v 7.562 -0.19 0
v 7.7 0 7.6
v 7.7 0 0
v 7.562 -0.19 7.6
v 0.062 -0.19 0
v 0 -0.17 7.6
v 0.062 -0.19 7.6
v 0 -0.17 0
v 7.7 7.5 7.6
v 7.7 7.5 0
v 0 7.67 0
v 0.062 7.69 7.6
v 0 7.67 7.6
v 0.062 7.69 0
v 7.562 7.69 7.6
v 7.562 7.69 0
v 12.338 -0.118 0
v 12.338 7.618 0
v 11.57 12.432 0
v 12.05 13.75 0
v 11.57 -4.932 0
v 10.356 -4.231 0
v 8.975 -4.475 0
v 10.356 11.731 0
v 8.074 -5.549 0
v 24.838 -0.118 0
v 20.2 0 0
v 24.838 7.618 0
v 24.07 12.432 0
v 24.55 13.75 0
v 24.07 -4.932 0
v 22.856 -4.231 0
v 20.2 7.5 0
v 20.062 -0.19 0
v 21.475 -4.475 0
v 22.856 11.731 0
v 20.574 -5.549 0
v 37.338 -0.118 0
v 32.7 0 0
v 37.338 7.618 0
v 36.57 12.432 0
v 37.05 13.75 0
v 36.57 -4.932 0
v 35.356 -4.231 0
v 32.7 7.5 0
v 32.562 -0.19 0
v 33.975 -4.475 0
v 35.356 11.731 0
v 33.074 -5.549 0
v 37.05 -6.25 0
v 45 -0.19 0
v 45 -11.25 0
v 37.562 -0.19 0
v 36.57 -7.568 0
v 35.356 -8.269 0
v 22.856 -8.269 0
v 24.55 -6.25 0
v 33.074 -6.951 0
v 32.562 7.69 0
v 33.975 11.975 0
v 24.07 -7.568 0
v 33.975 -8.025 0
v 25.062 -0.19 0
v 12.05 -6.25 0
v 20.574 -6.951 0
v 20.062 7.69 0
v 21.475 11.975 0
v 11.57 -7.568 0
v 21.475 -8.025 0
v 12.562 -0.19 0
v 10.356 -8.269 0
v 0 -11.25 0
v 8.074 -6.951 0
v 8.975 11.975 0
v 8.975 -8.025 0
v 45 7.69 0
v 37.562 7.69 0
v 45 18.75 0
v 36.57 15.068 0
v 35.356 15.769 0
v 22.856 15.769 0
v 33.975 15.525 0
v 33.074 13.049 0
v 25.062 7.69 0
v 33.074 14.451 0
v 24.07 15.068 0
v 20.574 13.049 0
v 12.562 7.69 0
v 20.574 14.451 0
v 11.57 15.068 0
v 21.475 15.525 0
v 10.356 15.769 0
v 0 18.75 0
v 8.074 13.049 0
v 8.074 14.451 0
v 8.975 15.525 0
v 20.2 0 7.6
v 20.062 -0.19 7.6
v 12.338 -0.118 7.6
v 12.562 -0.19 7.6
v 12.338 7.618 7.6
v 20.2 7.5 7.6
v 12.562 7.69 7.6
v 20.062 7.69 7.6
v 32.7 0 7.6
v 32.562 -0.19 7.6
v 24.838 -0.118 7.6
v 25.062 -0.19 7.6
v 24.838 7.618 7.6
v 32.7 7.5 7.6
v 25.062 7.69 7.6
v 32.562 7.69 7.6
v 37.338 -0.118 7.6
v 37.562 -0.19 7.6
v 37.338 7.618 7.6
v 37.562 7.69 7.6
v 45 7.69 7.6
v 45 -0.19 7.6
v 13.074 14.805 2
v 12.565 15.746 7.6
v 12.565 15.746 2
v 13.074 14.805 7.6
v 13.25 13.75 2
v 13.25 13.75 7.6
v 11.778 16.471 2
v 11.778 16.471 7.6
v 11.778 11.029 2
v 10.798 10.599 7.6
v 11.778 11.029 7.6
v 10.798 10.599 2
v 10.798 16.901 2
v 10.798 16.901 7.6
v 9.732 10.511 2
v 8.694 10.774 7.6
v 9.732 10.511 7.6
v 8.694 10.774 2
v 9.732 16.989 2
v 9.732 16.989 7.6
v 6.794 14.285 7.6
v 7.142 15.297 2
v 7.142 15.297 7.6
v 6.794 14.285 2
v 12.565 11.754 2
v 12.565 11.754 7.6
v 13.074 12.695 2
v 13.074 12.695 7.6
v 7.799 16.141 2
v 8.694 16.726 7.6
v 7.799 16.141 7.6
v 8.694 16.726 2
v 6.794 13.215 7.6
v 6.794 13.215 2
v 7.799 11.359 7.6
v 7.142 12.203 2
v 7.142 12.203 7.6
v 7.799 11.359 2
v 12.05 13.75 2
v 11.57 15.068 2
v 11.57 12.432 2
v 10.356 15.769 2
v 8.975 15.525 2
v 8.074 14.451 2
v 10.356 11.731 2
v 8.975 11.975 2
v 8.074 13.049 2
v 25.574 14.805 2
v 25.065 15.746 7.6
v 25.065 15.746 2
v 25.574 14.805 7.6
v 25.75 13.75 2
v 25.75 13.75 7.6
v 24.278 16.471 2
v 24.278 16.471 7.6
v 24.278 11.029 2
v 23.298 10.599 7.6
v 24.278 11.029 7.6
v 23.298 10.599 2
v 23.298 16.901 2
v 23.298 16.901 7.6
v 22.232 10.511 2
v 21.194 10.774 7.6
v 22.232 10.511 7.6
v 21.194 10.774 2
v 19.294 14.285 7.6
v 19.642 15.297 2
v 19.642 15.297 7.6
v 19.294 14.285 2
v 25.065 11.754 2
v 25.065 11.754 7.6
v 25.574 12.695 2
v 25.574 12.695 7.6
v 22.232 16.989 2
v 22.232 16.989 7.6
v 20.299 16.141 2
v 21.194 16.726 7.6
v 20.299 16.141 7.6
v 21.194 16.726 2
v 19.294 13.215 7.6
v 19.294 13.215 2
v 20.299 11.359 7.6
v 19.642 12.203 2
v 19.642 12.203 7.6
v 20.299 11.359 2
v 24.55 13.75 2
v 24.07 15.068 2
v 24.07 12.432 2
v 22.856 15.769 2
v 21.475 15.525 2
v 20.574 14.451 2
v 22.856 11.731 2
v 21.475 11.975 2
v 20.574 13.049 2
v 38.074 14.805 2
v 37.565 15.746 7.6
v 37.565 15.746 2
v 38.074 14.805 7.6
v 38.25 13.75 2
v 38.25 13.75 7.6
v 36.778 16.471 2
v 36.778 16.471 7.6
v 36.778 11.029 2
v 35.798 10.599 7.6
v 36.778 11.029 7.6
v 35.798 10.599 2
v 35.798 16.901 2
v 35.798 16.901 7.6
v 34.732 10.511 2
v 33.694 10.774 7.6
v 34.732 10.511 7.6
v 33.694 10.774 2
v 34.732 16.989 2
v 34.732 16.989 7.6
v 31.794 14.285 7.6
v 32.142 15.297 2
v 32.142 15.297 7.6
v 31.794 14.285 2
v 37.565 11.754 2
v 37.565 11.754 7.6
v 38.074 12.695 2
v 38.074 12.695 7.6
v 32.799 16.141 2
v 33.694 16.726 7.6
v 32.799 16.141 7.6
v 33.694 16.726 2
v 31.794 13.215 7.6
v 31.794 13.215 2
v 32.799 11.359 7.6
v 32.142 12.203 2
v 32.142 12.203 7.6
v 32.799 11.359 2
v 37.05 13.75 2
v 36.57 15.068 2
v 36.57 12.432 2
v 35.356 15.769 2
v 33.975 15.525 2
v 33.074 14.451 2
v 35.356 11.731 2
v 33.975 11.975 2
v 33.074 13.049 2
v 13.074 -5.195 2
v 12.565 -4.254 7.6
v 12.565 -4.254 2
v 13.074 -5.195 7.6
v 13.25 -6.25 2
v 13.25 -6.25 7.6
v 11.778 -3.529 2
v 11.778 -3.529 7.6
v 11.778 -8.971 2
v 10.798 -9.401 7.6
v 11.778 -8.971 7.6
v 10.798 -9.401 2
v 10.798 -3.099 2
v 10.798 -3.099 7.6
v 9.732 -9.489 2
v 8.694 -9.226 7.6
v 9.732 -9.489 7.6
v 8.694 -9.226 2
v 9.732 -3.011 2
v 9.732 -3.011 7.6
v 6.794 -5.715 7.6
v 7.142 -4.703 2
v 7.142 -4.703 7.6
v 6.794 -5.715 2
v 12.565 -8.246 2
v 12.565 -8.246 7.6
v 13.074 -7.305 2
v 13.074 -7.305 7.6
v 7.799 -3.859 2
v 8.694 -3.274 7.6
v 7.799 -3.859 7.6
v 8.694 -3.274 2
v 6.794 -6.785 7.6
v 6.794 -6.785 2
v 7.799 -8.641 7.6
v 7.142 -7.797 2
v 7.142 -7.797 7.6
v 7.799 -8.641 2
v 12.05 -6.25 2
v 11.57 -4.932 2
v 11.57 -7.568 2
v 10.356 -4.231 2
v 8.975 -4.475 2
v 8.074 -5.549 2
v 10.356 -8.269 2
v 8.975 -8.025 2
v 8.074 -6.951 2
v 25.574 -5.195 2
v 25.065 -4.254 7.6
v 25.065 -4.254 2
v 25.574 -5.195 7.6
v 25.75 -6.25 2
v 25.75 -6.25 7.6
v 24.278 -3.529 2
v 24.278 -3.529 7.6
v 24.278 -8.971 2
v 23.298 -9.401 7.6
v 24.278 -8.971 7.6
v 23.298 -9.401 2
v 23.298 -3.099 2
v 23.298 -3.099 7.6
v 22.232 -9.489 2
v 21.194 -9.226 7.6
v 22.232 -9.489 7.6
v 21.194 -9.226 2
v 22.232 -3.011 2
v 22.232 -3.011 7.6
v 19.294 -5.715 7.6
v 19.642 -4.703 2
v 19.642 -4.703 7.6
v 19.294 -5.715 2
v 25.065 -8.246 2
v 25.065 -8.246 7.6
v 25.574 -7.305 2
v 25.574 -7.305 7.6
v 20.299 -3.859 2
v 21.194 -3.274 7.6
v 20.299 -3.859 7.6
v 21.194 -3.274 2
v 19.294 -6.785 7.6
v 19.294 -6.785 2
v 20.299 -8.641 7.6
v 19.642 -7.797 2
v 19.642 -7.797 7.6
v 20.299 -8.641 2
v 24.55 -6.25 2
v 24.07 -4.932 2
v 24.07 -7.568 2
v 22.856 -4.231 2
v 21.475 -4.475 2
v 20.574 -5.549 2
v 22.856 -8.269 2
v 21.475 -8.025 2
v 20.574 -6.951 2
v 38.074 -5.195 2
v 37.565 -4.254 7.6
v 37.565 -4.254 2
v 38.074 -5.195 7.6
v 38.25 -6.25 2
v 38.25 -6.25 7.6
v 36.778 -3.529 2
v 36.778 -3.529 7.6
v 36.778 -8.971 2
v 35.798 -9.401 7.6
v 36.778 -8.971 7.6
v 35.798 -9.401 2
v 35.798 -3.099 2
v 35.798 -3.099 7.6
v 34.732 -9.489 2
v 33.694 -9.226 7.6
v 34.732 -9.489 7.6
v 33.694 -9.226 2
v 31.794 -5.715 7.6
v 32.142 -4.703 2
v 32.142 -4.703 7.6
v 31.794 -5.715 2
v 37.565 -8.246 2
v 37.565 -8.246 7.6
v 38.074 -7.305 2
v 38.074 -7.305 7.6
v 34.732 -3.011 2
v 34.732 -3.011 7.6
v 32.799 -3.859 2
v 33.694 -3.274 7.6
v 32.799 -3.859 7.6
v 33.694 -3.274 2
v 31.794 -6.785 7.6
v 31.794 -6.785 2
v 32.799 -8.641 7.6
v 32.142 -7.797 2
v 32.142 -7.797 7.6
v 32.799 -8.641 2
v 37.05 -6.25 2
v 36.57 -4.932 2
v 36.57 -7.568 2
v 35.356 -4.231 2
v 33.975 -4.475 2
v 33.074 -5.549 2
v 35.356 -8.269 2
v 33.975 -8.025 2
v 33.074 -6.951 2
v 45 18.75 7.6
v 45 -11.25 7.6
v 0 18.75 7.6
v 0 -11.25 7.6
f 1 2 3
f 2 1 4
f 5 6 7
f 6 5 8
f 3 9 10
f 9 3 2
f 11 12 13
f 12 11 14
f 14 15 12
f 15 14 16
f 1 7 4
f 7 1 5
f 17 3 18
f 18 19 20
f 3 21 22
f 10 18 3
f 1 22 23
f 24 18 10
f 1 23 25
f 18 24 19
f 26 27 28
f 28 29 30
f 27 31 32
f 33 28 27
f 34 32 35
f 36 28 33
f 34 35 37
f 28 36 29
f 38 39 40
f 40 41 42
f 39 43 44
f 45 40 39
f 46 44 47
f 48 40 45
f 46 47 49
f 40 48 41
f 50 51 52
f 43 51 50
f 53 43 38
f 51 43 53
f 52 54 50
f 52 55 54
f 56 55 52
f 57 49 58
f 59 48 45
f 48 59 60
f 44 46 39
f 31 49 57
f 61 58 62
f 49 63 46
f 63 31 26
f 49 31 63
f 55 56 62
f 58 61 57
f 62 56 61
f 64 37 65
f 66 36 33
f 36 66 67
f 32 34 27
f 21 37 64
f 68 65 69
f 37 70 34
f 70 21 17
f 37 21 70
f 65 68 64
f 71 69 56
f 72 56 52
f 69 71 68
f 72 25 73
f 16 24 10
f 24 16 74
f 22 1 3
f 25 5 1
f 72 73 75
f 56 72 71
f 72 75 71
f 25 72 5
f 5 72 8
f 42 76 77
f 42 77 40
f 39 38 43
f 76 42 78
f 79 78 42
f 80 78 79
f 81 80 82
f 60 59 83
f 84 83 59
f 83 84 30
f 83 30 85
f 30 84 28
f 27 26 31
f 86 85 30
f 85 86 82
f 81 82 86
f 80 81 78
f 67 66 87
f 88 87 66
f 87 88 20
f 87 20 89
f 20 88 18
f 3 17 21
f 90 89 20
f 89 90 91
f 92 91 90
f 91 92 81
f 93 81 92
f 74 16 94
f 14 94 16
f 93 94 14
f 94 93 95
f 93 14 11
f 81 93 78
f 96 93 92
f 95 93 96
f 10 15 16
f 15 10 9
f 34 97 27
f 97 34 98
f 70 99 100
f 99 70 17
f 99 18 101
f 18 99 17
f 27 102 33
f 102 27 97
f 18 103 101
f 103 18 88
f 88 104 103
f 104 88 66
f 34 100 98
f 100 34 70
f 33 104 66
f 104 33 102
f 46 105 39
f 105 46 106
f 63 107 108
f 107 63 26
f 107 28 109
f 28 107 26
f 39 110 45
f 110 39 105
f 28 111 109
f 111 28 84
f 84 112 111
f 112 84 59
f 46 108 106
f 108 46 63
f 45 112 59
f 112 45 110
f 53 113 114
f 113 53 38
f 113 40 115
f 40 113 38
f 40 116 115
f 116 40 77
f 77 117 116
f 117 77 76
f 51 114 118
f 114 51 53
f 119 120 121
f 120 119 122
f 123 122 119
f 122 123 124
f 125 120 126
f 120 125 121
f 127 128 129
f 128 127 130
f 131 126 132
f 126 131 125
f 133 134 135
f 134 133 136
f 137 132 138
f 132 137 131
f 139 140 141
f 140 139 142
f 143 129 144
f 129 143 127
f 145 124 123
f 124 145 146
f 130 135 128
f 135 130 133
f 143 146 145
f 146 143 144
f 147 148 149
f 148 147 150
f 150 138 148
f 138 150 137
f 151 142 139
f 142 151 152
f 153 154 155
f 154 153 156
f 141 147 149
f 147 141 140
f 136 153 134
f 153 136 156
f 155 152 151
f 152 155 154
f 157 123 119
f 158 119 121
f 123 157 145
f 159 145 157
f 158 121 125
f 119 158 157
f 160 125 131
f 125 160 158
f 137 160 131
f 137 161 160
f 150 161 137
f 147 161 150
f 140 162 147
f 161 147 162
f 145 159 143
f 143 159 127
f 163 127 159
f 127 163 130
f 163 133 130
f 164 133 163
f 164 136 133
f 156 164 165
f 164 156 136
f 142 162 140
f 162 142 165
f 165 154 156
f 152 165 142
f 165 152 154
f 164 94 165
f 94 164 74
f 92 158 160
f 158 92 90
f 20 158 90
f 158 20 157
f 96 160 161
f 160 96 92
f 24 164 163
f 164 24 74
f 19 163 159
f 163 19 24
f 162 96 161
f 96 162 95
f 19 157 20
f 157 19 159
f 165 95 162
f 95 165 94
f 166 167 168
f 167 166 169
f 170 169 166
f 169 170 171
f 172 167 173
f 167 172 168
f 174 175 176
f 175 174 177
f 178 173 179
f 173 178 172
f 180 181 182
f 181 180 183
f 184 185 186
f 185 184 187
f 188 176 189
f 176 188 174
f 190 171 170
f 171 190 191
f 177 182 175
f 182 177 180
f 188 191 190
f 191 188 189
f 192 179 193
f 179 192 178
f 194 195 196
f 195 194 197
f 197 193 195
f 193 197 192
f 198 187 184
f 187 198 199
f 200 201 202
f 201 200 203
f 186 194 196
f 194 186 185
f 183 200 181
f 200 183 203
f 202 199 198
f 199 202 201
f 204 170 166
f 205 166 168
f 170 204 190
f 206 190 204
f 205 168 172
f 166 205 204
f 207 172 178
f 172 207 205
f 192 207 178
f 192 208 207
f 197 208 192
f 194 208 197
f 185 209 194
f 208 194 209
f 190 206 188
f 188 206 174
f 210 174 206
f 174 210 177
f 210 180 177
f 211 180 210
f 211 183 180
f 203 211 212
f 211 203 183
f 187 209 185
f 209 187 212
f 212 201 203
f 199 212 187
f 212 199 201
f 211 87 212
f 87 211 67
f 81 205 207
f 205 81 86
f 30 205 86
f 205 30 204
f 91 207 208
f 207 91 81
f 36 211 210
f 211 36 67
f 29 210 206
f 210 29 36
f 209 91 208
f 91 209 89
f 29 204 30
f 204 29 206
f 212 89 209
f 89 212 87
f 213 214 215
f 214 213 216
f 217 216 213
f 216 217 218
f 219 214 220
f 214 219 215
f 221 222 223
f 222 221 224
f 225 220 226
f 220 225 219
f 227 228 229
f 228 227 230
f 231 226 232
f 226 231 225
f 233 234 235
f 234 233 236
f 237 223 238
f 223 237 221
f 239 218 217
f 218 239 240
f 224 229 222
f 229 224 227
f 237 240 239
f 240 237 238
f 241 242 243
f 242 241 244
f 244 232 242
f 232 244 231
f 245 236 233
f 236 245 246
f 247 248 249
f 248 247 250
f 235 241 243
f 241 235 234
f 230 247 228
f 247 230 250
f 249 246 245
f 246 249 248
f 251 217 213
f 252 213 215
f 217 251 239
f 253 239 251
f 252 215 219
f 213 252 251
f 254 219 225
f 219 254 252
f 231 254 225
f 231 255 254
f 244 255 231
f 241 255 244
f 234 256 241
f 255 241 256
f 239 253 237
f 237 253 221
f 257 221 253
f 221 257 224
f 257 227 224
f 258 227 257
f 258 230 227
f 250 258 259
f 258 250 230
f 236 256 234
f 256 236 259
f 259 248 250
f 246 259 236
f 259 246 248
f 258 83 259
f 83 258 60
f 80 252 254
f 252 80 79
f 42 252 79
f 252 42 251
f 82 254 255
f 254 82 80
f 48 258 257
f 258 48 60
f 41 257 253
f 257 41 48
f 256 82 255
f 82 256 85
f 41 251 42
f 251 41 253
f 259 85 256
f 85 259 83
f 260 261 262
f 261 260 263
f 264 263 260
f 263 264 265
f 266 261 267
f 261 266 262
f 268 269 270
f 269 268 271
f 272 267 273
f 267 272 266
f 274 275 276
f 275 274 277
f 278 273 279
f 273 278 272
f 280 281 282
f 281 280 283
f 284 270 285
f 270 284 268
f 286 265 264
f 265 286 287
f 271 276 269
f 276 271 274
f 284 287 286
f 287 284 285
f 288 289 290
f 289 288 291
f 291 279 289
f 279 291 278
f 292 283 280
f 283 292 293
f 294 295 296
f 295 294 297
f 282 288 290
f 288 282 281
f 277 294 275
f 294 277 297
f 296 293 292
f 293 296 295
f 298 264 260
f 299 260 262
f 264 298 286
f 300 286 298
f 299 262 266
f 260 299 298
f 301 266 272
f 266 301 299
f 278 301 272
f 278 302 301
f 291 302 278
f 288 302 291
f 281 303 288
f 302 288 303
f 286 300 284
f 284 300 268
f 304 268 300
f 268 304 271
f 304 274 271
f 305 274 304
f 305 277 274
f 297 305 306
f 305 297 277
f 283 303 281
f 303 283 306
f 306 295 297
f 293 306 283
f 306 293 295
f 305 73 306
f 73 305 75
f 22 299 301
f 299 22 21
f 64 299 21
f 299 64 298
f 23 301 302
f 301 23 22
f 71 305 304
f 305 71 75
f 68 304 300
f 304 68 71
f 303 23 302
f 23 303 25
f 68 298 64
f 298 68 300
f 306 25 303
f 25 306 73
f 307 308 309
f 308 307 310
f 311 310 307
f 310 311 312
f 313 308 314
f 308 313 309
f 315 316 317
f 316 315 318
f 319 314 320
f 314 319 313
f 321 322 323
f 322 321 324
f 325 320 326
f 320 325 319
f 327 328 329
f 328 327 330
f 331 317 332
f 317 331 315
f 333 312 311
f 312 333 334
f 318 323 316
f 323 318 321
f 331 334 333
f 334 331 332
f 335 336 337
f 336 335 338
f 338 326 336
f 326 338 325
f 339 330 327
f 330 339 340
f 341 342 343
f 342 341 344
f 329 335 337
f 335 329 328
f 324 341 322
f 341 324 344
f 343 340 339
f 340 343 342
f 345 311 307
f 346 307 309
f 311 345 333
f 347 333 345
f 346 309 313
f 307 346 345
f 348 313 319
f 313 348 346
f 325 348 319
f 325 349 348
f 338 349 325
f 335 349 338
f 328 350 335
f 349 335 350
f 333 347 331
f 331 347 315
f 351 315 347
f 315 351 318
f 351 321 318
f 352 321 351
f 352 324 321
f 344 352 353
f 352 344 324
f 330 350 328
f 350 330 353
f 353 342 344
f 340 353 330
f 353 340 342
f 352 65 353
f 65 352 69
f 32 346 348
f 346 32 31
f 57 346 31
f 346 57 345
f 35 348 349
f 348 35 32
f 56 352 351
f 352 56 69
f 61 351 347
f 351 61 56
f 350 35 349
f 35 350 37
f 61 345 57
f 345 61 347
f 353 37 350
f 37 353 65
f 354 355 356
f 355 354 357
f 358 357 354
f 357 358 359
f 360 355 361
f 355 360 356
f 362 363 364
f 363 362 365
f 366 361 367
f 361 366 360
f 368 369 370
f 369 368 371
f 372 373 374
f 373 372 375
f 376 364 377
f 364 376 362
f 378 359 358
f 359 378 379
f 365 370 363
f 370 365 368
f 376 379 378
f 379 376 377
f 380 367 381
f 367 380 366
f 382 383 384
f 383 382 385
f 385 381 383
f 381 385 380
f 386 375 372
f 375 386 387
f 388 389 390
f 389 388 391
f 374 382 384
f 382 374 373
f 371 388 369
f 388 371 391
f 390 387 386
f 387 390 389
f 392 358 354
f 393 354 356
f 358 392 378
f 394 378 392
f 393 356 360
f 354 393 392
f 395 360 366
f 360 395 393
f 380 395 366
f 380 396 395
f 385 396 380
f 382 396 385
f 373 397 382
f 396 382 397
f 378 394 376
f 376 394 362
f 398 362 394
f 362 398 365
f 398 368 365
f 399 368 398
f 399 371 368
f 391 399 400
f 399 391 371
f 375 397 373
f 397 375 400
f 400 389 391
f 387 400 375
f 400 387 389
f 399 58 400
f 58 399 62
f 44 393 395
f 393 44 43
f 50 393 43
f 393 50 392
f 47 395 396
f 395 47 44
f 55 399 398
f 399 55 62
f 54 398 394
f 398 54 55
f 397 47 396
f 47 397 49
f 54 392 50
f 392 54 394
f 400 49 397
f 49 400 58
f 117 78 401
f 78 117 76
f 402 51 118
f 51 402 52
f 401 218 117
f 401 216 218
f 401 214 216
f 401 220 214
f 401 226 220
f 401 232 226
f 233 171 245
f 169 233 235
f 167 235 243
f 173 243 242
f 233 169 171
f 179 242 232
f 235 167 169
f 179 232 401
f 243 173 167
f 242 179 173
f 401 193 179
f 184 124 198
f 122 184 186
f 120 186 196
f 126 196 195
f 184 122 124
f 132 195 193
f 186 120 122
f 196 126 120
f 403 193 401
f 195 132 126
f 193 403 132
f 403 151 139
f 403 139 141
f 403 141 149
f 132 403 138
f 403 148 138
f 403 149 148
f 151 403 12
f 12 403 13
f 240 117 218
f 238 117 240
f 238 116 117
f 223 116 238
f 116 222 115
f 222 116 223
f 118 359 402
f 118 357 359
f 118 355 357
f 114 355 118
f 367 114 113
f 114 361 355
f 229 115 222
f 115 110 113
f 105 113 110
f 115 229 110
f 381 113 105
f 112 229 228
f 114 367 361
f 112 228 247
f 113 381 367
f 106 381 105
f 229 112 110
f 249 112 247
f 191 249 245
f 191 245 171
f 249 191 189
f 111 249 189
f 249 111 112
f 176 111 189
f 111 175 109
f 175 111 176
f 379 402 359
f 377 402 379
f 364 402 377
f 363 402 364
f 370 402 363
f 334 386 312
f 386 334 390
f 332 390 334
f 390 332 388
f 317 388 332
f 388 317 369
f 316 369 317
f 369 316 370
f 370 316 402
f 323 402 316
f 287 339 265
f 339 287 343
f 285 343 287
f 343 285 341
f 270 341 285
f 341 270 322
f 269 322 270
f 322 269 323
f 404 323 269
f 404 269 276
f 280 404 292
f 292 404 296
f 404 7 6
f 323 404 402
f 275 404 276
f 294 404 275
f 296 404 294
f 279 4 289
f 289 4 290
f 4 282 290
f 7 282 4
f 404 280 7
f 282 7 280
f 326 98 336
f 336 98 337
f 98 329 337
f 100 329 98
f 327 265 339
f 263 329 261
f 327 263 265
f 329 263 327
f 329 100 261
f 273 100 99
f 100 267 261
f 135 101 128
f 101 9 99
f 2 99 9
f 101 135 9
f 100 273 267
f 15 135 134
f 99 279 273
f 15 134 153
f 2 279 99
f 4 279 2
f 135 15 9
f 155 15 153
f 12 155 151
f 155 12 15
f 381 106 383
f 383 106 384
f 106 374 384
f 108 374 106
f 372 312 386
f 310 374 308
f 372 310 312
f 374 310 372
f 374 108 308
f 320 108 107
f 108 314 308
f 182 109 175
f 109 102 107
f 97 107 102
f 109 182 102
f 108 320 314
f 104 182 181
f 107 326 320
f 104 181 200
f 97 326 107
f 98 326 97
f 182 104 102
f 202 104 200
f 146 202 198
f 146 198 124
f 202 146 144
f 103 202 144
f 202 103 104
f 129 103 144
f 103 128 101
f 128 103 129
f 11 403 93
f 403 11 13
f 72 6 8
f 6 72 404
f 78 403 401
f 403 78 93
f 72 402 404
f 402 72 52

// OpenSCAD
xy = 7.5;
width = 9;
length = xy+(2.5+0.2)*2;
sensor_height = 5.6;
sensor_gap = 2;
// left to right, l_hammer_size > r_hammer_size
l_hammer_size = 33.5;
r_hammer_size = 33.3;
l_curvature = l_hammer_size / 2;
r_curvature = r_hammer_size / 2;

curvature_x0 = l_curvature;
curvature_m = (r_curvature - l_curvature) / 3;

module cny70_gap() {
  minkowski() {
    cube([xy, xy, (sensor_height+sensor_gap)*1.5]);  
    cylinder(h=0.1, r=0.2);
  }
}

module multiprotect(x) {
 imax = x-1;
 difference() {
   translate([0, -11.25, 0])
     cube([12.5*imax+xy,
           30,
           (sensor_height + sensor_gap)]);

   for(i=[0:imax]) {
      translate([i*12.5, 0, 0])
        #cny70_gap();
   }
   /*
   translate([0, xy/2, 0])
     for(i=[0:imax]) {
       curvature = curvature_x0 + curvature_m * i;
       translate([12.5*i, 0, curvature+sensor_height+sensor_gap])
         rotate([0, 90, 0])
           cylinder(h=12.5, r=curvature);
     }
   */
   translate([0, xy/2, 0])
     for(y=[-1:2:1]) {
       for(i=[0:(imax-1)]) {
         translate([10+12.5*i, y*-10, 2])
           cylinder(h=30, d=6.5, $fn=19);
         translate([10+12.5*i, y*-10, -2])
           cylinder(h=4, d=4.1, $fn=9);
       }
     }
  /*
  translate([0, -sensor_height/2, sensor_height/2])
    #sphere(r=2);
  */
 }
}

multiprotect(4);
